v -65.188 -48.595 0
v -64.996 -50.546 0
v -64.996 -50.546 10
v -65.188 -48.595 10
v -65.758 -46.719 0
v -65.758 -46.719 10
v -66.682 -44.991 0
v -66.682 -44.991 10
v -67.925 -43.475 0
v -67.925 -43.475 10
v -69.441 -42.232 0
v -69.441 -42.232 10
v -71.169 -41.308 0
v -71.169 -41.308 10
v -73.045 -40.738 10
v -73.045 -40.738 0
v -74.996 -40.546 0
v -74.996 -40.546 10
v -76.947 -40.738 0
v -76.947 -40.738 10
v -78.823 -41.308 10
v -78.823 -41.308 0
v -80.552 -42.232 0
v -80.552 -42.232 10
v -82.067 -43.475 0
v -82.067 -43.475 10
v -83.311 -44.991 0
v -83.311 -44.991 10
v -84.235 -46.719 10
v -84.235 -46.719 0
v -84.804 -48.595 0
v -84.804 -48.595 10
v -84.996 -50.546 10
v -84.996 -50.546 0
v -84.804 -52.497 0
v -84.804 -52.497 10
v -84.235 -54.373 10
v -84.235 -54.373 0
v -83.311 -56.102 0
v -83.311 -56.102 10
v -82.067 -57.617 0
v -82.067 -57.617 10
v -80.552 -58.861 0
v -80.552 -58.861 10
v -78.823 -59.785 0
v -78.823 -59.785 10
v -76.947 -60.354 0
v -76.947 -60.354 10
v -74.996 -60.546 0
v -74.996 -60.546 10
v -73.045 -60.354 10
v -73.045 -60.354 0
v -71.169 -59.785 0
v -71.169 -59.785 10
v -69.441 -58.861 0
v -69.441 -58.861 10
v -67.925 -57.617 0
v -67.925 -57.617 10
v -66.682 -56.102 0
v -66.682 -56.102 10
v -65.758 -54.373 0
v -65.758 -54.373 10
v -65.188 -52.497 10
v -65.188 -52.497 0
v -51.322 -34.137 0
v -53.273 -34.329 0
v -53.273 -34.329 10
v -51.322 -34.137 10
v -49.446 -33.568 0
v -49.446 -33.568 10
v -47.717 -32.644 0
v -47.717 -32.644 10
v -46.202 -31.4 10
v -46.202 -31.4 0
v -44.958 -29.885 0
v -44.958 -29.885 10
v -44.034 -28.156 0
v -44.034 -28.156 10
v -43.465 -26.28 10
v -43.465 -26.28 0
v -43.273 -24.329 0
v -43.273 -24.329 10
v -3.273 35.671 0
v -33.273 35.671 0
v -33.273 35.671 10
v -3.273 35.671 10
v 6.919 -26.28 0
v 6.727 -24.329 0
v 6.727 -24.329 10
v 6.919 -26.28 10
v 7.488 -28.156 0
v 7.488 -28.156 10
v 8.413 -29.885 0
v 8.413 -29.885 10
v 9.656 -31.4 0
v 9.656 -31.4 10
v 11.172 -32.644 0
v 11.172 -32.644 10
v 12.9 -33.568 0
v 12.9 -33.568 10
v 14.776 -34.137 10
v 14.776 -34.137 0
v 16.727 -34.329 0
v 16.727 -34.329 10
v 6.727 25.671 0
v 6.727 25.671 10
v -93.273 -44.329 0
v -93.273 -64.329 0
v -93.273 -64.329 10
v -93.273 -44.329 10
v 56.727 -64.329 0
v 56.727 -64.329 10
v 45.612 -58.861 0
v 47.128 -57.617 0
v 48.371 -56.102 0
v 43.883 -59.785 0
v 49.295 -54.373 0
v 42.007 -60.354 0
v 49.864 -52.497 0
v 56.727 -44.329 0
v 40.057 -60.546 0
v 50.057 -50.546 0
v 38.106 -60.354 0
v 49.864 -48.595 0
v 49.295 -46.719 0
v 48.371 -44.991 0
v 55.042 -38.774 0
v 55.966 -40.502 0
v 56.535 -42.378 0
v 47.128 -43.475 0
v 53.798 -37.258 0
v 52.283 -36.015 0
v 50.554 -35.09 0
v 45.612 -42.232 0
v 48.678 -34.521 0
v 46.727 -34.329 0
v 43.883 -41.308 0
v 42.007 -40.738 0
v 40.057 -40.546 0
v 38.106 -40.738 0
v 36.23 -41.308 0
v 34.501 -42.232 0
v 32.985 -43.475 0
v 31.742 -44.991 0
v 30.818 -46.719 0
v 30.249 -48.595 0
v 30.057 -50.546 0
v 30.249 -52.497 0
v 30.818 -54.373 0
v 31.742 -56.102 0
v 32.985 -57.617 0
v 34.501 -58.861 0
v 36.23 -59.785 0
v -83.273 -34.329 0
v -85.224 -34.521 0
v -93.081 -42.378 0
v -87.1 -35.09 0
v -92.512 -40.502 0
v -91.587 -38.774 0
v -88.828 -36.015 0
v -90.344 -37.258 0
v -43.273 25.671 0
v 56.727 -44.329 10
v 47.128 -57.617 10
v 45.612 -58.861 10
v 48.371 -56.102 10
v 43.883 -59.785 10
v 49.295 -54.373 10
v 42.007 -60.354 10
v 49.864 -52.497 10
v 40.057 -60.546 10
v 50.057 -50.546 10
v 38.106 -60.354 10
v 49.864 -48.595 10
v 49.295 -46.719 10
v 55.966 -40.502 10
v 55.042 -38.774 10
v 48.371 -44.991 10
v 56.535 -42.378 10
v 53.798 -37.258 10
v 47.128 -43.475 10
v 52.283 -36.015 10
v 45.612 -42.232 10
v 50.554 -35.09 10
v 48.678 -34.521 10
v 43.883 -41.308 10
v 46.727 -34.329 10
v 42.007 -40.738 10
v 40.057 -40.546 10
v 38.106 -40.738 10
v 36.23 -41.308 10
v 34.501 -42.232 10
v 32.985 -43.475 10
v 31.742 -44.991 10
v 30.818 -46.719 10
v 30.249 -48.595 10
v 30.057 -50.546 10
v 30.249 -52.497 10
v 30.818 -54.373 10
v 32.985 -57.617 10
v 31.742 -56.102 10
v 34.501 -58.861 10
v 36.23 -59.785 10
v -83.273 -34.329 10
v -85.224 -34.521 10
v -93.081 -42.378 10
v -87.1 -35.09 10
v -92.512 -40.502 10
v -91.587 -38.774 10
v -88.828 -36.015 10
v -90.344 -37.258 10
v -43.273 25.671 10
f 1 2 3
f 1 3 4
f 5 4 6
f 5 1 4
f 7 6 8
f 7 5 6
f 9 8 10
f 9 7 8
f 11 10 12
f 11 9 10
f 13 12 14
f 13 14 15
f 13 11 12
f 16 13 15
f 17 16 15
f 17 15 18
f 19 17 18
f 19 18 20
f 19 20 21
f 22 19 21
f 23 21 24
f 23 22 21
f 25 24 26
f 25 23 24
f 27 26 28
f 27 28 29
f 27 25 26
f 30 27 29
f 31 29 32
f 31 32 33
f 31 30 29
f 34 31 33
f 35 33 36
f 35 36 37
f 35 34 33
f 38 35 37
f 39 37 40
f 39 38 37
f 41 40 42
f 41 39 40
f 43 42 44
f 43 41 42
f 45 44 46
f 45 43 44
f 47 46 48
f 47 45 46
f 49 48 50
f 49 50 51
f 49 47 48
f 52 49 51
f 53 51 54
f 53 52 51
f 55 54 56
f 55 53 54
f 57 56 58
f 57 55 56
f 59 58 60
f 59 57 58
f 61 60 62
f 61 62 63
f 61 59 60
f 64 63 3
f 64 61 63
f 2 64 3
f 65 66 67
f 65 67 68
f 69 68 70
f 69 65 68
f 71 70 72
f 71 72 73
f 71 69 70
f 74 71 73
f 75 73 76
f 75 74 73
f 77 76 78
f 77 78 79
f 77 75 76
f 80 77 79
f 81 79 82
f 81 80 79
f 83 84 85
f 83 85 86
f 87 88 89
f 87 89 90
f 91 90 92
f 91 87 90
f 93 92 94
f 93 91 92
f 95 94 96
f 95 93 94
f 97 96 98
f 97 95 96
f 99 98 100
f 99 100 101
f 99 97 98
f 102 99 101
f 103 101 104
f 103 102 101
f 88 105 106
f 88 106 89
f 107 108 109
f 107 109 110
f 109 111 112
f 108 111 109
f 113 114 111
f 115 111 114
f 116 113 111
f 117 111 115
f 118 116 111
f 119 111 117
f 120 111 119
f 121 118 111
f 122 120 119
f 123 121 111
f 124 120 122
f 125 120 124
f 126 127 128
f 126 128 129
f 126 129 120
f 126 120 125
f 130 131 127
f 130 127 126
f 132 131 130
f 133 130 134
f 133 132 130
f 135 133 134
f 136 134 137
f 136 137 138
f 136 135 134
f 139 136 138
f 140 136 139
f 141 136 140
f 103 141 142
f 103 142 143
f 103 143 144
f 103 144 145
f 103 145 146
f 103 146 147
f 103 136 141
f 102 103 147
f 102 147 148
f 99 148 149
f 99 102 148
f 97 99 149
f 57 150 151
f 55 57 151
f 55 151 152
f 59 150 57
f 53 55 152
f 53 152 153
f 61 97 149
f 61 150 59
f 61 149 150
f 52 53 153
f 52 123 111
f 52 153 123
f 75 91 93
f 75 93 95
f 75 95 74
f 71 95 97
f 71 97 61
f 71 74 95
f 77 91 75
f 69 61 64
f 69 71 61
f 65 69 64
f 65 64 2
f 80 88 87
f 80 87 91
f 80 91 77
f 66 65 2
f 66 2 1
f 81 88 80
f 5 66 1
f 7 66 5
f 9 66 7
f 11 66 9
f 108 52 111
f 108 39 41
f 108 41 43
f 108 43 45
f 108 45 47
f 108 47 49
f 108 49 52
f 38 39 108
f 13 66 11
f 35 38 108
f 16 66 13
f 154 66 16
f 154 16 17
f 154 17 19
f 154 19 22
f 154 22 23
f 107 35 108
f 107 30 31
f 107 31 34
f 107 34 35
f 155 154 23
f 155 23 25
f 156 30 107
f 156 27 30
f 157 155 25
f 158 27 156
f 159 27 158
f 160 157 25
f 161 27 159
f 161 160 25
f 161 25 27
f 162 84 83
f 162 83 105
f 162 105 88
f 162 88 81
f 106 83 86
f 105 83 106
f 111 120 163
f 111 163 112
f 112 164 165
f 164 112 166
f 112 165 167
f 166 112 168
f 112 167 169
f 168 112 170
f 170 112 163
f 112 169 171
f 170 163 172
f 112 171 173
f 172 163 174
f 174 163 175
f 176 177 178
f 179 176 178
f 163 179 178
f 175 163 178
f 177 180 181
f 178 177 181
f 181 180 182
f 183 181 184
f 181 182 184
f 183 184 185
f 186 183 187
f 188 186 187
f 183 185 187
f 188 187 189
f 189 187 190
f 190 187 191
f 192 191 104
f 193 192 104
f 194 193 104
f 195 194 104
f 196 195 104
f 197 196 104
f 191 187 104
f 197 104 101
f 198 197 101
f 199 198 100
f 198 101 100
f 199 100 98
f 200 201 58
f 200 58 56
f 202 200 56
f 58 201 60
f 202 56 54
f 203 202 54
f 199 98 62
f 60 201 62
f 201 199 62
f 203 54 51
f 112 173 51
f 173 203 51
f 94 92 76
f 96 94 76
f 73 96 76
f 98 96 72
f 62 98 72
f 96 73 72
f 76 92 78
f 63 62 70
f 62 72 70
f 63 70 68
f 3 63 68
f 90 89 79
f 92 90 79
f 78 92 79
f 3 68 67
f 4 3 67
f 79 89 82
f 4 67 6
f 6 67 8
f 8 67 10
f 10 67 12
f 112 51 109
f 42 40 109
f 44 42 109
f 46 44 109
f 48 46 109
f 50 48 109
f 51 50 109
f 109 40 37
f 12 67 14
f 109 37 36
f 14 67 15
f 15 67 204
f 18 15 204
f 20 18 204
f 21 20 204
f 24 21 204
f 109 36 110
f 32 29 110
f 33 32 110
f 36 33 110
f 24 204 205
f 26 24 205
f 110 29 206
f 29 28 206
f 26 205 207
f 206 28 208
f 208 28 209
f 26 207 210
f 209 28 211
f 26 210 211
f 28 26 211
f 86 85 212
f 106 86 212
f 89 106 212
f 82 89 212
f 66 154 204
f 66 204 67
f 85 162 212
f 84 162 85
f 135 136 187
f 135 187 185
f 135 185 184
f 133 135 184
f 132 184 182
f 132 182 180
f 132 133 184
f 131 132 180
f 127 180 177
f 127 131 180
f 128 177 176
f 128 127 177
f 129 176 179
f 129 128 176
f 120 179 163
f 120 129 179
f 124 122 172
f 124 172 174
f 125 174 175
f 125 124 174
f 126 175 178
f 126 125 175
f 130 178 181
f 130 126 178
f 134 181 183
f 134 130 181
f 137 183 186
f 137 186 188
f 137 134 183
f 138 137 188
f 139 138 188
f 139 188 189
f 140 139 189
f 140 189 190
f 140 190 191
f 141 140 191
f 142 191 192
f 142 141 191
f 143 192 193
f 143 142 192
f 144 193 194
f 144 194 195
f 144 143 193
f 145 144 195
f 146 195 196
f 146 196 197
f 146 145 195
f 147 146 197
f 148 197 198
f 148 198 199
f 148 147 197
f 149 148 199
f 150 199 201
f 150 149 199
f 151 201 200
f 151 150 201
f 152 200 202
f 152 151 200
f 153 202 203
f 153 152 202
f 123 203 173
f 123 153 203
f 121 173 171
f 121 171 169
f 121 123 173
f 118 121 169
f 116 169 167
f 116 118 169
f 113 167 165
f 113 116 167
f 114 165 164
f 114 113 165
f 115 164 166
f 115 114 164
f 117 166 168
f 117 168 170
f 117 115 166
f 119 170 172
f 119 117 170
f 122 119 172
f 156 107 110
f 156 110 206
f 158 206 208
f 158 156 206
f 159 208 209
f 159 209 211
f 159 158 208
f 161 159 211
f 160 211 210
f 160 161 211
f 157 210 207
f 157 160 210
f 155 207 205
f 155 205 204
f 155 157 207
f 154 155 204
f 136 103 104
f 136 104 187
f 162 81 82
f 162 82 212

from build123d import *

# Parameters (mm, degrees)
SKETCH1_R           = 10
BOSS_EXTRUDE1_DEPTH = 10


with BuildPart() as part:
    # Sketch1 → Boss-Extrude1 (new body)
    with BuildSketch(Plane.XY):
        with BuildLine():
            Line((-33.27272534, 35.670760078), (-3.27272534, 35.670760078))
            Line((-3.27272534, 35.670760078), (6.72727466, 25.670760078))
            Line((6.72727466, 25.670760078), (6.72727466, -24.329239922))
            ThreePointArc((6.72727466, -24.329239922), (9.656206848, -31.400307734), (16.72727466, -34.329239922))
            Line((16.72727466, -34.329239922), (46.72727466, -34.329239922))
            ThreePointArc((46.72727466, -34.329239922), (53.798342472, -37.258172111), (56.72727466, -44.329239922))
            Line((56.72727466, -44.329239922), (56.72727466, -64.329239922))
            Line((56.72727466, -64.329239922), (-93.27272534, -64.329239922))
            Line((-93.27272534, -64.329239922), (-93.27272534, -44.329239922))
            ThreePointArc((-93.27272534, -44.329239922), (-90.343793152, -37.258172111), (-83.27272534, -34.329239922))
            Line((-83.27272534, -34.329239922), (-53.27272534, -34.329239922))
            ThreePointArc((-53.27272534, -34.329239922), (-46.201657528, -31.400307734), (-43.27272534, -24.329239922))
            Line((-43.27272534, -24.329239922), (-43.27272534, 25.670760078))
            Line((-43.27272534, 25.670760078), (-33.27272534, 35.670760078))
        make_face()
        with Locations((-74.996311147, -50.546321168)):
            Circle(SKETCH1_R, mode=Mode.SUBTRACT)
        with Locations((40.056509267, -50.546321168)):
            Circle(SKETCH1_R, mode=Mode.SUBTRACT)
    extrude(amount=BOSS_EXTRUDE1_DEPTH)


solid = part.part
